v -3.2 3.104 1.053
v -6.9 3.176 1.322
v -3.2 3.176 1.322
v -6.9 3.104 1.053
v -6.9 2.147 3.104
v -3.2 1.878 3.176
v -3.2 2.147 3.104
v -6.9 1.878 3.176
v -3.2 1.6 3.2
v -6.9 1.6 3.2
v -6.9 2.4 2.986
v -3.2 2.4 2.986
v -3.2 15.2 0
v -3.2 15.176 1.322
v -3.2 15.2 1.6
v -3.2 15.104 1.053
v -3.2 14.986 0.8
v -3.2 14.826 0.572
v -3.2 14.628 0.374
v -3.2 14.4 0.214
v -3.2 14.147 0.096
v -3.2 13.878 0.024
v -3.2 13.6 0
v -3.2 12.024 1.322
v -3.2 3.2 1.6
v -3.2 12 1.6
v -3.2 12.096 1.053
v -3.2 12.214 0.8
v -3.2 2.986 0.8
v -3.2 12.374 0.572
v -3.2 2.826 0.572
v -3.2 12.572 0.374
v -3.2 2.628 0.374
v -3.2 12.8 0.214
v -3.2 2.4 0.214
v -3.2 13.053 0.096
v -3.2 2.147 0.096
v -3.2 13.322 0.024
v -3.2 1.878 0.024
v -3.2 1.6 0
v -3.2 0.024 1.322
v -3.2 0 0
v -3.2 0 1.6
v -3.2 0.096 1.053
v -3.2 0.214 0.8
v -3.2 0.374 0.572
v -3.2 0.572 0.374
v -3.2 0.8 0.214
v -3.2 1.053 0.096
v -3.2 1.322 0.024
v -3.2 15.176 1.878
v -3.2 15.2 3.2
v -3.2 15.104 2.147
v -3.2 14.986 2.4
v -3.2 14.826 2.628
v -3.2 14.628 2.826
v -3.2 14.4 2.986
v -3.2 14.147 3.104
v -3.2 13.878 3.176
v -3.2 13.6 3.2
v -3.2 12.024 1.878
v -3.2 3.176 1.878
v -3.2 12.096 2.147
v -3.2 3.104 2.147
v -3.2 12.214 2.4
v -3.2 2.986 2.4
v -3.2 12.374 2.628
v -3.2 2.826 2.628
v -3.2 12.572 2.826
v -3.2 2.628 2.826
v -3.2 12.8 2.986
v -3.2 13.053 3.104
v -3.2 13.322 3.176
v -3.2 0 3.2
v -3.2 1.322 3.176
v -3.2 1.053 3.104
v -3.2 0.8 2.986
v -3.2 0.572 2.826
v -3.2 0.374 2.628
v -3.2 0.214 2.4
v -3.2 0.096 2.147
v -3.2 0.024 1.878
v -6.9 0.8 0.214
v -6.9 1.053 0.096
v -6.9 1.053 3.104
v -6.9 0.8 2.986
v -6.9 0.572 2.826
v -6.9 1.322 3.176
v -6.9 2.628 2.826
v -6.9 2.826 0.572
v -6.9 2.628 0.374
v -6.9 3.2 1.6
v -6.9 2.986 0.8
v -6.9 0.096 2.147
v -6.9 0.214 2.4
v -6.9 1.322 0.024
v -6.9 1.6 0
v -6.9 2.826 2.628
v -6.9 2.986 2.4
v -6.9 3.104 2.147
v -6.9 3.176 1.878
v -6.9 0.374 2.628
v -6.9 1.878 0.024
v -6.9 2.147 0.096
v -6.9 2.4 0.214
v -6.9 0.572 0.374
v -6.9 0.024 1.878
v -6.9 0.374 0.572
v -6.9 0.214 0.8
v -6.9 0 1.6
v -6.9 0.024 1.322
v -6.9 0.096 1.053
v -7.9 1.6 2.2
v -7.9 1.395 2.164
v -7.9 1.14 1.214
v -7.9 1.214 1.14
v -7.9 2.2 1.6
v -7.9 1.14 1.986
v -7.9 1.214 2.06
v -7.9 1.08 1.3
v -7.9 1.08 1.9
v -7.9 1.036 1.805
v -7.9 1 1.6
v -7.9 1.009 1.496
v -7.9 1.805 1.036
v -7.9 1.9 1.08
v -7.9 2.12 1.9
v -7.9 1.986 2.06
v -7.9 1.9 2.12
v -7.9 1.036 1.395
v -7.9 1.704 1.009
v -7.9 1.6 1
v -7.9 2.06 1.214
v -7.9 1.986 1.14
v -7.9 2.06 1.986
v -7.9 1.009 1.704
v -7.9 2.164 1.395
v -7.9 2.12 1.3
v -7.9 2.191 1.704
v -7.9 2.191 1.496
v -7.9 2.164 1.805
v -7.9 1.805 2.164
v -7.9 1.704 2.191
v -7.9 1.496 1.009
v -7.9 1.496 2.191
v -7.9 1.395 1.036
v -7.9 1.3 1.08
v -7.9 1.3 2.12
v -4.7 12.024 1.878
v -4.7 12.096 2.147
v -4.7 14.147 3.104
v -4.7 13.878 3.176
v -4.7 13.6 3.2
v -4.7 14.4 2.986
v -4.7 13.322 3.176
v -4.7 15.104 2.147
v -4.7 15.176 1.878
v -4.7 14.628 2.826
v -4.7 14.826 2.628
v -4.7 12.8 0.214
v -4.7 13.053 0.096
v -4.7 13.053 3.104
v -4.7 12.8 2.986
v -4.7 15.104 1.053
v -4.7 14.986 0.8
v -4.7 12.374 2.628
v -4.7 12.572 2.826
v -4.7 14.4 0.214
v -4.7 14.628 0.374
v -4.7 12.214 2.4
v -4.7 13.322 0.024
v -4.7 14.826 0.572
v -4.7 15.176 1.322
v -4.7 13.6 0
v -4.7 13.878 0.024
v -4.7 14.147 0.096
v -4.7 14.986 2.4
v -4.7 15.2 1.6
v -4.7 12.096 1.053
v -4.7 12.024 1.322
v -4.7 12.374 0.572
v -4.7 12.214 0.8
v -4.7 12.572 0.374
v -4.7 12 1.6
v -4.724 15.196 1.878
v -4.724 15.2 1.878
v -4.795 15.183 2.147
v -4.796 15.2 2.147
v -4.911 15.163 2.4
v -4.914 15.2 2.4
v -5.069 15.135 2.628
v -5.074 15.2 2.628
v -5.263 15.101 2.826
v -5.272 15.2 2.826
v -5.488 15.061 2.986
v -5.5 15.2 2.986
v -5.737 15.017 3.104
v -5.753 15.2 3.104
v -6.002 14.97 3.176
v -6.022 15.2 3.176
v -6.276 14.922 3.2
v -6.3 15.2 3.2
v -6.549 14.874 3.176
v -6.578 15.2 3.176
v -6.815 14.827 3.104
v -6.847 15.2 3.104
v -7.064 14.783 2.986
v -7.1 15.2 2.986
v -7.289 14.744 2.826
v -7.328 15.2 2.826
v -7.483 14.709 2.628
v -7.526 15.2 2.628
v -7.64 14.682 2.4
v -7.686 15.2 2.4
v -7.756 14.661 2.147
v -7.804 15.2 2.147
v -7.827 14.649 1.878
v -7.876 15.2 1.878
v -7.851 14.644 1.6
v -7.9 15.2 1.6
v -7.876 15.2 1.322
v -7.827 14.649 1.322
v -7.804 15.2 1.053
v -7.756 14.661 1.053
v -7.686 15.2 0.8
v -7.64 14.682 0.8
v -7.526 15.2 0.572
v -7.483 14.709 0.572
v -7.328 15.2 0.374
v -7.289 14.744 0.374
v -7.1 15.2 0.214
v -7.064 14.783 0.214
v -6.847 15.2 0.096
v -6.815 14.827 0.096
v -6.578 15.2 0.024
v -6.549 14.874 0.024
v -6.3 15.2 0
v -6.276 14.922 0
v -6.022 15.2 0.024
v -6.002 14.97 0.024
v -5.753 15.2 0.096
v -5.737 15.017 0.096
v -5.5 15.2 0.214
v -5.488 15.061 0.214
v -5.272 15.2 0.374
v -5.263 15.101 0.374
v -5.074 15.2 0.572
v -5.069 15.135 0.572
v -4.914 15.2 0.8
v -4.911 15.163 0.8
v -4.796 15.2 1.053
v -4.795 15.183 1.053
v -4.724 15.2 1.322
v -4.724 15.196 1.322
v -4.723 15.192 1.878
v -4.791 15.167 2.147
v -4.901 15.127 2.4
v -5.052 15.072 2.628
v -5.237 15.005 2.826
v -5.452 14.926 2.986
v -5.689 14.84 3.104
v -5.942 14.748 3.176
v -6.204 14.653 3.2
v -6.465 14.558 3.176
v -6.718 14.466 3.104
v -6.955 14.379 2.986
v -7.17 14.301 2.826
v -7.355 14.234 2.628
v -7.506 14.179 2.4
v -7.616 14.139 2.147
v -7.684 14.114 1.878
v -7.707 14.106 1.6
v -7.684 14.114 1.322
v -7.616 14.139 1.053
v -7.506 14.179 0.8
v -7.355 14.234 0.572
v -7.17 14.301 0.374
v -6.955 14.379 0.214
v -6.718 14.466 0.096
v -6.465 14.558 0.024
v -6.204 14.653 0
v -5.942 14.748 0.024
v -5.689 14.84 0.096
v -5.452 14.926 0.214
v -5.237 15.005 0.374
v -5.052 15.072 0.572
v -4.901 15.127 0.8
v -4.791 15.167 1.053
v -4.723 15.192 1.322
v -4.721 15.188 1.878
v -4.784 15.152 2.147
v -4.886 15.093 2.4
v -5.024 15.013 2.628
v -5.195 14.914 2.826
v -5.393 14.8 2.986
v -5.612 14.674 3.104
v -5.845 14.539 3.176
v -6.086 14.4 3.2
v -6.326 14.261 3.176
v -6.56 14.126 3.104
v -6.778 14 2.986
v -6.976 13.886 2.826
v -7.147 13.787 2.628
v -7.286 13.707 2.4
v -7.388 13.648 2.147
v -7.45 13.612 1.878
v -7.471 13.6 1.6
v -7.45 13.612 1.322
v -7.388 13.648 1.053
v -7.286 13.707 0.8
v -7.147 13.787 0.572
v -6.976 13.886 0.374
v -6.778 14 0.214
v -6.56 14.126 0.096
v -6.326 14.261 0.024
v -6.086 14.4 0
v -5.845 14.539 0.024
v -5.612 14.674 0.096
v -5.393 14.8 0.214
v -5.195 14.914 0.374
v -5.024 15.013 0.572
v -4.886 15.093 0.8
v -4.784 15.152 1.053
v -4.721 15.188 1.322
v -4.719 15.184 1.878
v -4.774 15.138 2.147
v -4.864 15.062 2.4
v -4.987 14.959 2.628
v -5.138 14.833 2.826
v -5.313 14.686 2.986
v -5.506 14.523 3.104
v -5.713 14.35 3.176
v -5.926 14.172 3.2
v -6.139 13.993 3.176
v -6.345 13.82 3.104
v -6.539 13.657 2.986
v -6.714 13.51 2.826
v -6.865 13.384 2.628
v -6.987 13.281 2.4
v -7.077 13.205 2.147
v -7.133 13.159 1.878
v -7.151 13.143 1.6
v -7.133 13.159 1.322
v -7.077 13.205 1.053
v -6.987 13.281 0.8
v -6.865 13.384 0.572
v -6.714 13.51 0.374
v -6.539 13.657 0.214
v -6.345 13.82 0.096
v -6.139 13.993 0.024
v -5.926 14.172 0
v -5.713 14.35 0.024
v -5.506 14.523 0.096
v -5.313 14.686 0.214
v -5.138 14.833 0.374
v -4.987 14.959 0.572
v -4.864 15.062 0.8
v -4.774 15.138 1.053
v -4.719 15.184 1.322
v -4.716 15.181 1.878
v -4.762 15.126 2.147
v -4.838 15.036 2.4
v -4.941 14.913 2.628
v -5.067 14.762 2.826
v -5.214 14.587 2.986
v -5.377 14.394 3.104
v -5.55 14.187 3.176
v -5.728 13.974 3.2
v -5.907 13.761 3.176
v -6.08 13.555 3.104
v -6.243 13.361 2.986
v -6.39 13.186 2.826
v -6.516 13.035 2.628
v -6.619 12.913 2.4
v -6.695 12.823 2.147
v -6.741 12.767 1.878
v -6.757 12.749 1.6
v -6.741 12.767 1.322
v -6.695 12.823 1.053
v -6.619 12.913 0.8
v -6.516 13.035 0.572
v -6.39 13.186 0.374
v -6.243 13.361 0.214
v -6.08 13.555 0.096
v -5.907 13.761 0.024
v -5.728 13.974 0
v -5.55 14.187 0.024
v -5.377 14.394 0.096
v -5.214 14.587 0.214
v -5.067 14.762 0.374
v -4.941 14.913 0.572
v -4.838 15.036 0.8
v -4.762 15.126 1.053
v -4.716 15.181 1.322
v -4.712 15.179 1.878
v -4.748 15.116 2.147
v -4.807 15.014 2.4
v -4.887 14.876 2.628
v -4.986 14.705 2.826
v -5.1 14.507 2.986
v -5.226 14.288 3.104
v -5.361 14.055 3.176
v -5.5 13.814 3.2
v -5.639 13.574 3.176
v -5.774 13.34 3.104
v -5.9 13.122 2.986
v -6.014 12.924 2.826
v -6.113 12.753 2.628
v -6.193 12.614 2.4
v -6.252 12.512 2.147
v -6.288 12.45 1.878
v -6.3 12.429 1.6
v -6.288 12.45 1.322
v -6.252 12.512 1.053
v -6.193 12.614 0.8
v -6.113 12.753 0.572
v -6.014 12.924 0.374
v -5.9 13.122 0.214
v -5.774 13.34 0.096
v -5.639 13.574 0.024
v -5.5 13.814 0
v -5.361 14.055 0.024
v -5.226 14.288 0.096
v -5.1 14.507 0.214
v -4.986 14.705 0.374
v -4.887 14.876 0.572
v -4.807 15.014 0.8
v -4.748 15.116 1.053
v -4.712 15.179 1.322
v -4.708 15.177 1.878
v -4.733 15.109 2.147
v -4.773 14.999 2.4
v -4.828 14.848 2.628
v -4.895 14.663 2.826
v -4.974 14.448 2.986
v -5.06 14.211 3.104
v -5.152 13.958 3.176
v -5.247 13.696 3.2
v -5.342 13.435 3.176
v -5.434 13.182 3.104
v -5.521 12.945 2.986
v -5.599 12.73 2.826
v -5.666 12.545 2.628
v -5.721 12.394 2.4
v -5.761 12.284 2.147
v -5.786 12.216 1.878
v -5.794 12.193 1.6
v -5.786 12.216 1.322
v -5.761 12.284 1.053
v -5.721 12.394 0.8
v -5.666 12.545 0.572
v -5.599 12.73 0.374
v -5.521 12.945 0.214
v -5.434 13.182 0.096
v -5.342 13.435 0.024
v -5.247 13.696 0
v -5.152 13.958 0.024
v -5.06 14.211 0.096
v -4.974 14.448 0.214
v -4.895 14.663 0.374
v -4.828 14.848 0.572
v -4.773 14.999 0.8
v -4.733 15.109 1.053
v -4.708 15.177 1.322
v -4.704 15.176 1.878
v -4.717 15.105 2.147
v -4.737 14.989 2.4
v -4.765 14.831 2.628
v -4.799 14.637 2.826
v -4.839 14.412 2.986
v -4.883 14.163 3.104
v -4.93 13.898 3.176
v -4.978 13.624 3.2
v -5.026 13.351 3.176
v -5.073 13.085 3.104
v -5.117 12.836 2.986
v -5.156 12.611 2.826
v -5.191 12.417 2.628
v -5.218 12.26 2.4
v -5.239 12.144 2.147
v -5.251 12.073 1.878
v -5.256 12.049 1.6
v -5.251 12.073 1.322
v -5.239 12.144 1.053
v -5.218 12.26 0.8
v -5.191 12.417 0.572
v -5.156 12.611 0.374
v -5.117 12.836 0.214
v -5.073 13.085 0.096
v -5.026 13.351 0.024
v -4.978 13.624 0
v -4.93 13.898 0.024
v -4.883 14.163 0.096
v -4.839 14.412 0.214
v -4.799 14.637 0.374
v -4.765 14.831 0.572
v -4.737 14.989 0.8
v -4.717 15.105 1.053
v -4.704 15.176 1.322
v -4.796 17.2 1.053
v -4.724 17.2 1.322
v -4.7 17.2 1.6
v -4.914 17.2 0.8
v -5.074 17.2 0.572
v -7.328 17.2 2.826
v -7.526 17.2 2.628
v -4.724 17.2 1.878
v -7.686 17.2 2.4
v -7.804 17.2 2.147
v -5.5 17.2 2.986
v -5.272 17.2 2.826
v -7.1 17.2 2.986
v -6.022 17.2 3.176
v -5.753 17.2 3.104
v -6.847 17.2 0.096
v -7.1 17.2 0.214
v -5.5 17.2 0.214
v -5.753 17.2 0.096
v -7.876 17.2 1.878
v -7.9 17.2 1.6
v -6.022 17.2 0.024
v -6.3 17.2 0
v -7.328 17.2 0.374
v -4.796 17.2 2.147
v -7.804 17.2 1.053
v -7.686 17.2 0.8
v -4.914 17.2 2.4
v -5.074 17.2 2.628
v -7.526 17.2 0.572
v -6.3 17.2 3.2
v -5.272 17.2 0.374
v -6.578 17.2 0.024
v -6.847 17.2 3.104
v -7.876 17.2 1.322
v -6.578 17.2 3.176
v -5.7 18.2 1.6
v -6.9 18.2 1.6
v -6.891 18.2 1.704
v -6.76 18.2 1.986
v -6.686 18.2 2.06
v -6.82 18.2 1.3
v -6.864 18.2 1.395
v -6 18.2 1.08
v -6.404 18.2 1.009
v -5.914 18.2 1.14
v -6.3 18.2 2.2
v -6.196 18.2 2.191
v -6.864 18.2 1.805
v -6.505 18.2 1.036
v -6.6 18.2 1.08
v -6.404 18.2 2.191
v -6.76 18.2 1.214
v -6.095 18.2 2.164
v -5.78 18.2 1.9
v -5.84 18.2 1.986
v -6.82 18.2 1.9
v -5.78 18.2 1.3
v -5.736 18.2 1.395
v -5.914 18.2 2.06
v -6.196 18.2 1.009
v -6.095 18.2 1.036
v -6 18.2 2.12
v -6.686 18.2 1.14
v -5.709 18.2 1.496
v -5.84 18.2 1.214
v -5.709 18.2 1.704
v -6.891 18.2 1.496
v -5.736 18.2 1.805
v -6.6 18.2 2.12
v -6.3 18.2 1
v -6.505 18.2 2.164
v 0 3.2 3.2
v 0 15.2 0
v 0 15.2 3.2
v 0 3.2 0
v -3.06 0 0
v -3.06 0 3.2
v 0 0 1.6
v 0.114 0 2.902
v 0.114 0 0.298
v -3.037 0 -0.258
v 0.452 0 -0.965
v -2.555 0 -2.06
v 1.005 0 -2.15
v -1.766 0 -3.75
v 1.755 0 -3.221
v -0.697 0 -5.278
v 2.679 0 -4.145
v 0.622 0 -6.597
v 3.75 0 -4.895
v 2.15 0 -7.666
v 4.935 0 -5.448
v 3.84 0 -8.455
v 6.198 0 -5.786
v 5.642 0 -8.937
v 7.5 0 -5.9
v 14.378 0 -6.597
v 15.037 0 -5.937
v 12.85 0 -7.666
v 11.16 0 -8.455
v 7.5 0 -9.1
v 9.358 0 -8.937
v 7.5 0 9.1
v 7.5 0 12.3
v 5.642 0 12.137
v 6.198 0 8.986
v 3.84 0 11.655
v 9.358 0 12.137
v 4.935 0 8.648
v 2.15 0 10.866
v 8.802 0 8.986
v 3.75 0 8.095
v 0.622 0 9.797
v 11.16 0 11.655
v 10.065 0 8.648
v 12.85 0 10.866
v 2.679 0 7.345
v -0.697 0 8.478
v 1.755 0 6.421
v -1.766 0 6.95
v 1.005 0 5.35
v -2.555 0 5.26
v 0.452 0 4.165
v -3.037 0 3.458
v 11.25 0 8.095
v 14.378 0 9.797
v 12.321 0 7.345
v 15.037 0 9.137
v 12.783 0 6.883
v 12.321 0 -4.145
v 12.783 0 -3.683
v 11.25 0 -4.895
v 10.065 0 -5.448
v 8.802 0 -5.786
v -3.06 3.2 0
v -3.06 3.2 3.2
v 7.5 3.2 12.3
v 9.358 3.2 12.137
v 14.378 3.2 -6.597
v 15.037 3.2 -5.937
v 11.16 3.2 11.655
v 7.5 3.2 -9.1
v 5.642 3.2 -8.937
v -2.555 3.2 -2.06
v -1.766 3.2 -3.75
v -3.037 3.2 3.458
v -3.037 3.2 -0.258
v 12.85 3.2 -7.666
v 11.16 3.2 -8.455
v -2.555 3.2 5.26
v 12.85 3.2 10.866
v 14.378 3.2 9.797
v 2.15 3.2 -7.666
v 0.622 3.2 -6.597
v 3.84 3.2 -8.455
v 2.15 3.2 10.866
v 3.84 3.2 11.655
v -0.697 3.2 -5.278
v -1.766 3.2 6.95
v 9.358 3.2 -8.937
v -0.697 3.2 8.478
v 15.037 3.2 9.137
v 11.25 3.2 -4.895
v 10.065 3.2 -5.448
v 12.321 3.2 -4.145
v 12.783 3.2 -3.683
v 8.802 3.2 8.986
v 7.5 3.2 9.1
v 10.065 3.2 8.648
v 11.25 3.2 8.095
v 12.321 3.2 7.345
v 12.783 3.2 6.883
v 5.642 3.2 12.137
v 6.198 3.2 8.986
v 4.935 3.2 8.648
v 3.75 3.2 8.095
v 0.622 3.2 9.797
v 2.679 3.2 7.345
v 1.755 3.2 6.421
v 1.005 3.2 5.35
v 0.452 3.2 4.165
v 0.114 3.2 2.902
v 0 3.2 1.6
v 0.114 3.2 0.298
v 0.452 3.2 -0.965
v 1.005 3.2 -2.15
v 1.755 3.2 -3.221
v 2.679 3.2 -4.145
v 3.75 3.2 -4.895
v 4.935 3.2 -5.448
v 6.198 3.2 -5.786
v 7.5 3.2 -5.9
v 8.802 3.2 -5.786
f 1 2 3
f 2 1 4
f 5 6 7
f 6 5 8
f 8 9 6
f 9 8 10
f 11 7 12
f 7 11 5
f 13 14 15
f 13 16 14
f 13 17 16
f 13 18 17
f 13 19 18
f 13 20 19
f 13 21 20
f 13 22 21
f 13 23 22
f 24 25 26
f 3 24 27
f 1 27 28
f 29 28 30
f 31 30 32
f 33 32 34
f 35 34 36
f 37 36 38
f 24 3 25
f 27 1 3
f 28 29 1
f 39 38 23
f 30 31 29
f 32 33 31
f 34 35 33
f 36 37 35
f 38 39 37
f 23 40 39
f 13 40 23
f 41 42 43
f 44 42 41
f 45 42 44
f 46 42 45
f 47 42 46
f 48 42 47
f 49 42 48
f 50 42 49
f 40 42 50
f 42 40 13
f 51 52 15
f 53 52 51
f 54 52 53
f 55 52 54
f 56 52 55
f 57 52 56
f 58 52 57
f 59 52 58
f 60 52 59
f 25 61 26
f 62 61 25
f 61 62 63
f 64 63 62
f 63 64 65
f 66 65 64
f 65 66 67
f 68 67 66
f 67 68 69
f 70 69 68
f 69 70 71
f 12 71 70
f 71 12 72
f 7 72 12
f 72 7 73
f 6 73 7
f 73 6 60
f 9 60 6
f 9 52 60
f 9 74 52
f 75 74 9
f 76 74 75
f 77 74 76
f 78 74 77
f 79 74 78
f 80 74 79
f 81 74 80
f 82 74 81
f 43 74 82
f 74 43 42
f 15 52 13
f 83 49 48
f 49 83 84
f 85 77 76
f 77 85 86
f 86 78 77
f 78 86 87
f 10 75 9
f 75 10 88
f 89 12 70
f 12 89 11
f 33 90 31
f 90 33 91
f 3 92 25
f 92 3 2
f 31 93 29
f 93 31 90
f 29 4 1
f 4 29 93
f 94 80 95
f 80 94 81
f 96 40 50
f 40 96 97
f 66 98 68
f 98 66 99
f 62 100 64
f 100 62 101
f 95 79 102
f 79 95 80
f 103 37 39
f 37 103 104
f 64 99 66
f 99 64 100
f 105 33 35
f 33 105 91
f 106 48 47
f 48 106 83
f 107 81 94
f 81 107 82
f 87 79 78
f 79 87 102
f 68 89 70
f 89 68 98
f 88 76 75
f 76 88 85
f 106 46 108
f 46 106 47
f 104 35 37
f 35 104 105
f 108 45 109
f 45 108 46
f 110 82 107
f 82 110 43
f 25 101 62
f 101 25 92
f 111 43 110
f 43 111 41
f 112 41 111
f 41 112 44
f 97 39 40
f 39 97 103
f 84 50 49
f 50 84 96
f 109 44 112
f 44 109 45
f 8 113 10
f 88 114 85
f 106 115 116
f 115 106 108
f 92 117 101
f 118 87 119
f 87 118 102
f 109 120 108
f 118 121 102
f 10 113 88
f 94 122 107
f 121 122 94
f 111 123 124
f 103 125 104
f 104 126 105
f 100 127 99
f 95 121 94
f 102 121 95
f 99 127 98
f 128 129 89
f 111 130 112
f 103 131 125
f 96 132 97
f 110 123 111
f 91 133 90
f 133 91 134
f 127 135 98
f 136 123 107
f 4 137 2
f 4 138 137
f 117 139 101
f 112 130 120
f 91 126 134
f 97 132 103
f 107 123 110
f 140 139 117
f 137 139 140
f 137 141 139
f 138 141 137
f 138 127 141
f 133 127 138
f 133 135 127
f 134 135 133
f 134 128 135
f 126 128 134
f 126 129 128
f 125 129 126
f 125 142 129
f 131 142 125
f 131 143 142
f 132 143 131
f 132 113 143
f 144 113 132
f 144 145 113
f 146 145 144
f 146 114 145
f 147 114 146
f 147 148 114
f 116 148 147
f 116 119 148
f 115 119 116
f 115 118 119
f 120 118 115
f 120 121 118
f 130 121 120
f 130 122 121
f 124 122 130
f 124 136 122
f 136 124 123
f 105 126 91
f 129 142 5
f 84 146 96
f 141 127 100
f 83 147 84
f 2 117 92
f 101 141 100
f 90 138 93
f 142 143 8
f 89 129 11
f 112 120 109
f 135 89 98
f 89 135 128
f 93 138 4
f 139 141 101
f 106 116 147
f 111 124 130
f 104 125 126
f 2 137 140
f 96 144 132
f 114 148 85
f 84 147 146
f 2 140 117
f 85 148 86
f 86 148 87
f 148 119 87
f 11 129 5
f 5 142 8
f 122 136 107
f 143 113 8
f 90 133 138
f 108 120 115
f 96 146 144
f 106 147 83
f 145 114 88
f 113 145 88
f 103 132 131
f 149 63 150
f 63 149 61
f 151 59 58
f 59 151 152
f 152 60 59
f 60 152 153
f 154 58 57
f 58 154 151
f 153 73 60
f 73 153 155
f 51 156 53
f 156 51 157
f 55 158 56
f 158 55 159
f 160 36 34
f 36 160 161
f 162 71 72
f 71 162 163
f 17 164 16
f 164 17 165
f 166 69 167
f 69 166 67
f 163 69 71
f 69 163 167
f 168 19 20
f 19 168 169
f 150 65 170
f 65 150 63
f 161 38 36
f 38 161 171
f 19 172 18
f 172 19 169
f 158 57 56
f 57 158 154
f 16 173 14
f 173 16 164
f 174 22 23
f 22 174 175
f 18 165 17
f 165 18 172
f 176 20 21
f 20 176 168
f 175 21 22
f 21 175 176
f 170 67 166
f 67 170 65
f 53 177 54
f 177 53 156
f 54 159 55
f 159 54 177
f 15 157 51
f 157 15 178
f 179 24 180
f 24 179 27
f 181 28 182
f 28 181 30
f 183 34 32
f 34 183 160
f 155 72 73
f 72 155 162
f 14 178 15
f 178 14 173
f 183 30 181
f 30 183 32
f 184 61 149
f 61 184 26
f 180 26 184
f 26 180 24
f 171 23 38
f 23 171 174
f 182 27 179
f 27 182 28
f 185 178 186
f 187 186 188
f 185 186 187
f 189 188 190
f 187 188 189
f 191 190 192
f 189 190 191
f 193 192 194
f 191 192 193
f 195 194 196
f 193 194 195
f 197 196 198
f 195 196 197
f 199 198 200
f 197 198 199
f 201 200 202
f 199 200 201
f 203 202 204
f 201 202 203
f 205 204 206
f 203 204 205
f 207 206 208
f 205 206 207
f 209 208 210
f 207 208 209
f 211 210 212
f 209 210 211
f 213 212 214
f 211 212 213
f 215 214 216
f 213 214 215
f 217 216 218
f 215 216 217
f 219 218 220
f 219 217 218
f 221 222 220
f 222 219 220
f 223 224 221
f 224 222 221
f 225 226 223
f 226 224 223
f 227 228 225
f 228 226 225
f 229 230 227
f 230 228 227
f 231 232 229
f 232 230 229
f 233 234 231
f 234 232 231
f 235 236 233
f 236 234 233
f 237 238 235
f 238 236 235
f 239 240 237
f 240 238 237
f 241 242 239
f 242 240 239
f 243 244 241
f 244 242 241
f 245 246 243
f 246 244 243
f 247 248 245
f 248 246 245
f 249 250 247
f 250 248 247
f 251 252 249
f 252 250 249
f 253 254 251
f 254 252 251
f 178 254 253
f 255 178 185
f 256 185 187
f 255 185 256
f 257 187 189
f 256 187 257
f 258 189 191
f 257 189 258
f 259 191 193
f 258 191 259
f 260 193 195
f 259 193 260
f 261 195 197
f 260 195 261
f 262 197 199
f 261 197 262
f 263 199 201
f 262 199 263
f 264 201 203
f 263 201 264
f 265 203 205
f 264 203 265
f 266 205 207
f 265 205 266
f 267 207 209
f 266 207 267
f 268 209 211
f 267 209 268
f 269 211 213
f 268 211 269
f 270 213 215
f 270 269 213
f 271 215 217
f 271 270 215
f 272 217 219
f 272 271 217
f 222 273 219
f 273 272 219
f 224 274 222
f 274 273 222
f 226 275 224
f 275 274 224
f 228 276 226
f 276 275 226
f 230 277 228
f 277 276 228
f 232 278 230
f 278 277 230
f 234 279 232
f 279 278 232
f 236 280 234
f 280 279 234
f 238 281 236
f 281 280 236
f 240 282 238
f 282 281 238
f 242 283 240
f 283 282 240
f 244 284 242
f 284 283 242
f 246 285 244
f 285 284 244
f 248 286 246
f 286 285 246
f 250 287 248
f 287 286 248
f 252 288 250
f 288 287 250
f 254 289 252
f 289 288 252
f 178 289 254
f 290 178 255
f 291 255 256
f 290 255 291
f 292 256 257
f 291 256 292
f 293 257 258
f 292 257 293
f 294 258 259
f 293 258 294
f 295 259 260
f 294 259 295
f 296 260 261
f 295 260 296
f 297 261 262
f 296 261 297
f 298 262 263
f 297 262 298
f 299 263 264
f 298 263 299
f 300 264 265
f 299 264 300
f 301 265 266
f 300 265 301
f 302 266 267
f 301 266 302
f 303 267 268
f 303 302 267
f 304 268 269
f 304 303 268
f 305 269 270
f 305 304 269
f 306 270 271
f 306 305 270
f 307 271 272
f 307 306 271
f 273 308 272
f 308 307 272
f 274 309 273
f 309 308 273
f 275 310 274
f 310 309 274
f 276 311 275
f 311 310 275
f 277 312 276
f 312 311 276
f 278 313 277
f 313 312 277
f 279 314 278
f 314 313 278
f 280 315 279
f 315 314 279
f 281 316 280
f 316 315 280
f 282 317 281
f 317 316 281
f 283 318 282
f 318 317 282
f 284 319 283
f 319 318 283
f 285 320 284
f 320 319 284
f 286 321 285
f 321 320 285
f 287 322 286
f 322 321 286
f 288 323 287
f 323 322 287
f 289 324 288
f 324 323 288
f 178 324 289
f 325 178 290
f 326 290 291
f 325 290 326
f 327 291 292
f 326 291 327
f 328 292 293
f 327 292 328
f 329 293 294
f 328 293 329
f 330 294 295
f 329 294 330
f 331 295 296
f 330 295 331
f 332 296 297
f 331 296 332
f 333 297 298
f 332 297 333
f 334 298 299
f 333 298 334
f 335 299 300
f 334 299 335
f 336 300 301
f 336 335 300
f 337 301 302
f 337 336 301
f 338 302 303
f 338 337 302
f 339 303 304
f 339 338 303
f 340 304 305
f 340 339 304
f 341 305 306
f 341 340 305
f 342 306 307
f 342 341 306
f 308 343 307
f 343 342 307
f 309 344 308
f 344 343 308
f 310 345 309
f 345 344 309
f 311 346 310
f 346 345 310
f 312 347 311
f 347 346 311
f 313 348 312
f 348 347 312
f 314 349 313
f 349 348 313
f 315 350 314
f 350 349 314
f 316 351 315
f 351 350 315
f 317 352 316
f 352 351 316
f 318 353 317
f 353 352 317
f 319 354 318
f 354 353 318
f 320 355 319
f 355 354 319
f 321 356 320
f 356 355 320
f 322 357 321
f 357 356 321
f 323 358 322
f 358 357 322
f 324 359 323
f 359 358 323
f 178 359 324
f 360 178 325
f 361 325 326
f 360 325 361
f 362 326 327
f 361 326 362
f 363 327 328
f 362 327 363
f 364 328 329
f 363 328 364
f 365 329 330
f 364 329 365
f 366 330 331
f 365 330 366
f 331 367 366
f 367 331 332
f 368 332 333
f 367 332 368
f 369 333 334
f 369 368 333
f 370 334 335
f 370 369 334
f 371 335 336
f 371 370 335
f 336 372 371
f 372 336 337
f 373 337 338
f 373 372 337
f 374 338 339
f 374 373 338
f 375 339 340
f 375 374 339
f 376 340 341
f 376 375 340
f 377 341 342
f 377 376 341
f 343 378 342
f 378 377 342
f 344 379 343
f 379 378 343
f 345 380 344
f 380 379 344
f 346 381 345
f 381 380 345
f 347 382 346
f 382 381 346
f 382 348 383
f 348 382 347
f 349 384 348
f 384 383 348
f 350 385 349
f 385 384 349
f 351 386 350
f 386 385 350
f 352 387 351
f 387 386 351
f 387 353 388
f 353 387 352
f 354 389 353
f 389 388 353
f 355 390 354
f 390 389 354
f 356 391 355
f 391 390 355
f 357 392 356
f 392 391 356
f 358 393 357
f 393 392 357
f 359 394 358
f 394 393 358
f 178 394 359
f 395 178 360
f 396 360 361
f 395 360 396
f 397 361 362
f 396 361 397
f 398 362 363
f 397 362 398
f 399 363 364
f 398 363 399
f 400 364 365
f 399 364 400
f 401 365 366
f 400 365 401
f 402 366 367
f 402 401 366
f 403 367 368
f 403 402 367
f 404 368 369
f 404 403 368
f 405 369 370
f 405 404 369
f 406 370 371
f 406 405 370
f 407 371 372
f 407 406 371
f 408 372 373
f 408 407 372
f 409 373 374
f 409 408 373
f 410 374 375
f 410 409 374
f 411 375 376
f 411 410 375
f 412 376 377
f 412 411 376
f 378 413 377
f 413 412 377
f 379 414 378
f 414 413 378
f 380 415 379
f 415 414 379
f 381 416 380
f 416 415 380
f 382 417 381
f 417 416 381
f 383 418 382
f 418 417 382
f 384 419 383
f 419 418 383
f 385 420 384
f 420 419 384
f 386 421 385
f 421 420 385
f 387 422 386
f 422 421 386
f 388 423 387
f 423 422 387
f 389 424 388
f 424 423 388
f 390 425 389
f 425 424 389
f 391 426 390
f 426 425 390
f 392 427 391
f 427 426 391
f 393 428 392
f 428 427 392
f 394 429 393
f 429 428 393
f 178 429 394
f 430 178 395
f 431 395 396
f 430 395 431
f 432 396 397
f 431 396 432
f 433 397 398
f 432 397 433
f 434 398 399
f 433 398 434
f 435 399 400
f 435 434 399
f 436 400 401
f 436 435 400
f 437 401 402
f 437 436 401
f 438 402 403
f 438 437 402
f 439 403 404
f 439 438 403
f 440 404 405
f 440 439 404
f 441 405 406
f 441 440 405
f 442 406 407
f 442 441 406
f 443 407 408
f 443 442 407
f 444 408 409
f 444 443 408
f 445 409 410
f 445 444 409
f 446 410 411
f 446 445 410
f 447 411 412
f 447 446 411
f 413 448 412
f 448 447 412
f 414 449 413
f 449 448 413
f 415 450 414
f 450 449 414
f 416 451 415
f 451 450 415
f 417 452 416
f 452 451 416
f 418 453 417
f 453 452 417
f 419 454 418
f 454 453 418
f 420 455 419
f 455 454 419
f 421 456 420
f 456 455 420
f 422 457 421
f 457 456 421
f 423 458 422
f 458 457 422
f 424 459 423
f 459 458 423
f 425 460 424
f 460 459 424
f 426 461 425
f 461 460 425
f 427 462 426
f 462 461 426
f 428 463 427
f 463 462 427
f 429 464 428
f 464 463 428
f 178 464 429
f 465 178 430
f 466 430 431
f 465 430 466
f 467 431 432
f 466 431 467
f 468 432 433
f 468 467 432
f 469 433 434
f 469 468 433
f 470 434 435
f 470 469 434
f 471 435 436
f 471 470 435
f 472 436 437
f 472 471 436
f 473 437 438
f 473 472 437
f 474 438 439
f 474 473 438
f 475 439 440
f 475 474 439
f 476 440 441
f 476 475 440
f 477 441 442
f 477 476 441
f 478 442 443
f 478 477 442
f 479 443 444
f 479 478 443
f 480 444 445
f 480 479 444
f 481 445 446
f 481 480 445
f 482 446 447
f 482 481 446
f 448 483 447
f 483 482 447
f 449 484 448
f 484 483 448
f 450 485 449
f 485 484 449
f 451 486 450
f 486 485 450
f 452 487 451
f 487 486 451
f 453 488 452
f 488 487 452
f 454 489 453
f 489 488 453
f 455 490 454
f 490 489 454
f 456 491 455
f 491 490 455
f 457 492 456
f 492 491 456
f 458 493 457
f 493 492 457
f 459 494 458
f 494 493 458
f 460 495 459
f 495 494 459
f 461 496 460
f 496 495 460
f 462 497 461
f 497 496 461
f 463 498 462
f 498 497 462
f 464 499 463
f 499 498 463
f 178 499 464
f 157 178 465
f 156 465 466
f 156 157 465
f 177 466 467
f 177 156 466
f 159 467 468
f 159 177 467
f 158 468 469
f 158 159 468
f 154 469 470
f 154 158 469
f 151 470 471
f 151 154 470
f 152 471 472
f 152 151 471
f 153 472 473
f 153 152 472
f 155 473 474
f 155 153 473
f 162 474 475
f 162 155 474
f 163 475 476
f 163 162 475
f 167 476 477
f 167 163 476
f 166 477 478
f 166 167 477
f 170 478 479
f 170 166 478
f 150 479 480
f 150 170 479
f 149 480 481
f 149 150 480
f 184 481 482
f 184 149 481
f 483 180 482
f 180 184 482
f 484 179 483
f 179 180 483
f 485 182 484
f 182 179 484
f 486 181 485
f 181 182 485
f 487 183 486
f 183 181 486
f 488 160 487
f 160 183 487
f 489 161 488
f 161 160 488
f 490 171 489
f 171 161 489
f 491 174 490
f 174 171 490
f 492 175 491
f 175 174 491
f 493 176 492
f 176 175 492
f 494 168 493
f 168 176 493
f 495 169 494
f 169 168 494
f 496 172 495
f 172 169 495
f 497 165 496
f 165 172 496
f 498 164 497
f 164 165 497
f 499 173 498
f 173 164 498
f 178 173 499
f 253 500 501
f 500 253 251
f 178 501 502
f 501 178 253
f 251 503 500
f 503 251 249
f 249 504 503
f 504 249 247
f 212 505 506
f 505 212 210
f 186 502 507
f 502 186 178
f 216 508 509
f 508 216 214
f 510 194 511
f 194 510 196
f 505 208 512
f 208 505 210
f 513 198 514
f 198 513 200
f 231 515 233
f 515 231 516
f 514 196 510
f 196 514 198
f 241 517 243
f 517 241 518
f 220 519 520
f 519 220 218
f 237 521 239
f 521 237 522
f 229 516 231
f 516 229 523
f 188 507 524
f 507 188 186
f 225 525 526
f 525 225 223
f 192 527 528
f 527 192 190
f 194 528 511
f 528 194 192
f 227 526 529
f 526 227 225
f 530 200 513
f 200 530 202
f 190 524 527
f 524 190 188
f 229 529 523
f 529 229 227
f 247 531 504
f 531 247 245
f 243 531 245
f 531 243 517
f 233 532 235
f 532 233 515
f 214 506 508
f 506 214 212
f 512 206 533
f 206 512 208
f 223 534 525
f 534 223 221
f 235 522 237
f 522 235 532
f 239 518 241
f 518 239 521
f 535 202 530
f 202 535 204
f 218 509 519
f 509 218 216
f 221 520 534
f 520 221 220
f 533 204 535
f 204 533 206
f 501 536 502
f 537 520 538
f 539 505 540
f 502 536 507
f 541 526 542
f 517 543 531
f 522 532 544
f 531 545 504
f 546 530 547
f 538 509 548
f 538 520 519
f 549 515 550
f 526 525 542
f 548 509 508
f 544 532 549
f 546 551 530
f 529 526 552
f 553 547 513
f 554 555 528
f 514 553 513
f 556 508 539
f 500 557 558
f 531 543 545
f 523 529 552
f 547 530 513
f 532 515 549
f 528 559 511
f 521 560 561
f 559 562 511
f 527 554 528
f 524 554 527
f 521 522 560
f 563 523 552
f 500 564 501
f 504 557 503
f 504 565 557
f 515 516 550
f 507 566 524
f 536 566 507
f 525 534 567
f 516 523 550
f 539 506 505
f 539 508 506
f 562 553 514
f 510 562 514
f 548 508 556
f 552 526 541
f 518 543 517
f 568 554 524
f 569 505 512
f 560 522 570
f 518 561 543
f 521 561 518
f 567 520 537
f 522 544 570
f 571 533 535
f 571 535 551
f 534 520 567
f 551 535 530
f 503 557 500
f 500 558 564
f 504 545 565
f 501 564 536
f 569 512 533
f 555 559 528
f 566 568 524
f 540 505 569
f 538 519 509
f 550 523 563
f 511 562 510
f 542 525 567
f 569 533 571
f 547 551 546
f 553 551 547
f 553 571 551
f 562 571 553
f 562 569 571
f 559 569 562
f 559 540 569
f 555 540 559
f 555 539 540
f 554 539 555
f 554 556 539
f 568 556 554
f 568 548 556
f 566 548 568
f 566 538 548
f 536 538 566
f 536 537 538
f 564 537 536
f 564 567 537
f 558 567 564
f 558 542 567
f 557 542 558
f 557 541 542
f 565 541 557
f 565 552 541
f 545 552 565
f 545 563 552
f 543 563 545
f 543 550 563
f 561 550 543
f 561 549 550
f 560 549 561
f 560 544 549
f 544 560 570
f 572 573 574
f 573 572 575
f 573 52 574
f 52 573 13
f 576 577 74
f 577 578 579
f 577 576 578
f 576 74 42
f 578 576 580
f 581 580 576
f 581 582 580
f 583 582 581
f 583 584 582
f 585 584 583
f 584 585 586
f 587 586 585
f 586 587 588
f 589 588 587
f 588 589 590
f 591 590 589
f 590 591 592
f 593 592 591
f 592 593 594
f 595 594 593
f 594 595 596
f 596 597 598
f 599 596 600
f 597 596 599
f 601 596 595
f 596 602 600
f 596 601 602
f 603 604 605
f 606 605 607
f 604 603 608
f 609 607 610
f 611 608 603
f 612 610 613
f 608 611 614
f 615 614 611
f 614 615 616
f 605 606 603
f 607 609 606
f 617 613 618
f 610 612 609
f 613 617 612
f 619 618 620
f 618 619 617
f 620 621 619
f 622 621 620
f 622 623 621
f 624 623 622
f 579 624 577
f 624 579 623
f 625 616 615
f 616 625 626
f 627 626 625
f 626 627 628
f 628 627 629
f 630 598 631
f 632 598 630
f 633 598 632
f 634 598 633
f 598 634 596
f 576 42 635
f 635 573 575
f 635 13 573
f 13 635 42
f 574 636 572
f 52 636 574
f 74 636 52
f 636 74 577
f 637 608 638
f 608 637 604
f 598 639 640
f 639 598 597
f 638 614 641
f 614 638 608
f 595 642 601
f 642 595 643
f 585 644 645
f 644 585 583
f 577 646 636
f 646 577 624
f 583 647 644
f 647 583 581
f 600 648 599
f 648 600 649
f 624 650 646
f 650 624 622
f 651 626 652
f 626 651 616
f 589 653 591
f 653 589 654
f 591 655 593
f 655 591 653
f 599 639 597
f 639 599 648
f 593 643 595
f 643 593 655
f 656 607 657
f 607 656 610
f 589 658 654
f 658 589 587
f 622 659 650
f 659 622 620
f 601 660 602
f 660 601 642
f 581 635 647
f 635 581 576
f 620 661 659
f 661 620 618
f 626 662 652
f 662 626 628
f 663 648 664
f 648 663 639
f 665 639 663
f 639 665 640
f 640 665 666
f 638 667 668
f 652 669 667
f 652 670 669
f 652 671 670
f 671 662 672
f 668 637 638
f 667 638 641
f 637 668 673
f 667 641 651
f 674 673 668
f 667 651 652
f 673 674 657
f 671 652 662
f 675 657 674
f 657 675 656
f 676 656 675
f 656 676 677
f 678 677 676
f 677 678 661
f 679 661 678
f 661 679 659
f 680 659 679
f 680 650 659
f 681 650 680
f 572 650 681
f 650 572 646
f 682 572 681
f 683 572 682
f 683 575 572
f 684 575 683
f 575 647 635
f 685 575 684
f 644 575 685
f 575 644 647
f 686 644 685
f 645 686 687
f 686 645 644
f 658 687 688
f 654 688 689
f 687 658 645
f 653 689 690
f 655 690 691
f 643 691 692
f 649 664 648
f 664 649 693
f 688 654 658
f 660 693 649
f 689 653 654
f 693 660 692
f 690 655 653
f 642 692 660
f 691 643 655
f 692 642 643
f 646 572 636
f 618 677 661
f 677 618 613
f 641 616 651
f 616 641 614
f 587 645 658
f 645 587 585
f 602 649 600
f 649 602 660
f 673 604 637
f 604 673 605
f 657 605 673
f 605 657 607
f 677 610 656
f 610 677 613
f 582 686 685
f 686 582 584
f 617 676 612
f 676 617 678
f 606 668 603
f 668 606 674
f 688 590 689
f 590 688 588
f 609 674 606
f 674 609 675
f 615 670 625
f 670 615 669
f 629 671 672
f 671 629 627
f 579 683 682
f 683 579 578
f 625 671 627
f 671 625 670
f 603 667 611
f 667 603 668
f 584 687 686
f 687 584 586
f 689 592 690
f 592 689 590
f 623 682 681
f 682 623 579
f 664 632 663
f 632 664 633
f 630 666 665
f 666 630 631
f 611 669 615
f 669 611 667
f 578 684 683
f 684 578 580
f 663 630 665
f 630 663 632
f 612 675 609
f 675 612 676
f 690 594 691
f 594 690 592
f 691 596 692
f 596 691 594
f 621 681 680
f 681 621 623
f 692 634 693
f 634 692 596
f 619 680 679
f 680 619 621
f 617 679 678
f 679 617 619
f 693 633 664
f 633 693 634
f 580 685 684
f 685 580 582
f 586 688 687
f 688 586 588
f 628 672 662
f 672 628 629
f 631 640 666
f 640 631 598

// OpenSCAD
// file: main.scad
rpeg = 1.60; // radius of peg. Also used for almost everything else.

/* [Hidden] */
dpeg = 2.0 * rpeg;

module rounded_plate(thickness=dpeg, width = 12, height=12)
{
    thalf = thickness/2.0;
    cube([thalf, dpeg + width, height + dpeg]);
		translate([thalf, thalf]) cube([thalf, dpeg + width - thickness, height + dpeg]);
		translate([thalf, thalf]) cylinder(height + dpeg, thalf, thalf);
		translate([thalf, dpeg + width - thalf]) cylinder(height + dpeg, thalf, thalf);
}

module base(sep = 1, width = 1, dist = 1, thickness = rpeg * 2, rounded = false)
{
	w = width - 1;

	for(i = [0:dist:w])
		translate([0, (i * 12) + rpeg, rpeg]) rotate([90, 0]) pegs(sep);
    
	//backplate
	if(rounded == false)
		cube([thickness, dpeg + (w * 12), sep * 12 + dpeg]);
	else
        rounded_plate(thickness, w*12, sep*12);
}

module pegs(sep)
{
	s = sep * 12;
	depth = 1.5;
	r = rpeg;

	rotate([0, -90])
	{
		cylinder(depth - 1 + (r * 2), r, r);
		translate([0, 0, depth - 1 + (r * 2)]) cylinder(1, r, r - 1);
		translate([0, s]) cylinder(depth, r, r);
	}
	translate([-depth, s + r]) rotate_extrude(angle=90) translate([-r, 0]) circle(r);
	translate([-depth - r, s + r]) rotate([-90]) cylinder(2, r, r);
	translate([-depth - r, s + r + 2]) rotate([-90, 0]) cylinder(1, r, r - 1);
}

//base(1, 3, 1, rounded = false);
// main file
include <main.scad> // base(), rpeg
rring = 15/2;
dopen = 90; // Degrees open

/* [Hidden] */
$fn = 36;

module ring(open = 0)
{
    dpeg = rpeg*2.0;
    
	translate([-dpeg, 0, dpeg]) rotate([-90, 0]) base(1, 1, 1);

    rotate([-90,0,0])
    translate([rring, -rpeg, 0])
    difference() {
        cylinder(r=rring+dpeg, h=dpeg);
        translate([0,0,-0.1]) cylinder(r=rring, h=dpeg+0.2);
        
        rotate([0, 0, -dopen/2]) 
        rotate_extrude(angle=dopen, convexity = 10)
        translate([rring-0.1,-0.1,0]) square([dpeg+0.2, dpeg+0.2]);
        
    }
}

ring();
